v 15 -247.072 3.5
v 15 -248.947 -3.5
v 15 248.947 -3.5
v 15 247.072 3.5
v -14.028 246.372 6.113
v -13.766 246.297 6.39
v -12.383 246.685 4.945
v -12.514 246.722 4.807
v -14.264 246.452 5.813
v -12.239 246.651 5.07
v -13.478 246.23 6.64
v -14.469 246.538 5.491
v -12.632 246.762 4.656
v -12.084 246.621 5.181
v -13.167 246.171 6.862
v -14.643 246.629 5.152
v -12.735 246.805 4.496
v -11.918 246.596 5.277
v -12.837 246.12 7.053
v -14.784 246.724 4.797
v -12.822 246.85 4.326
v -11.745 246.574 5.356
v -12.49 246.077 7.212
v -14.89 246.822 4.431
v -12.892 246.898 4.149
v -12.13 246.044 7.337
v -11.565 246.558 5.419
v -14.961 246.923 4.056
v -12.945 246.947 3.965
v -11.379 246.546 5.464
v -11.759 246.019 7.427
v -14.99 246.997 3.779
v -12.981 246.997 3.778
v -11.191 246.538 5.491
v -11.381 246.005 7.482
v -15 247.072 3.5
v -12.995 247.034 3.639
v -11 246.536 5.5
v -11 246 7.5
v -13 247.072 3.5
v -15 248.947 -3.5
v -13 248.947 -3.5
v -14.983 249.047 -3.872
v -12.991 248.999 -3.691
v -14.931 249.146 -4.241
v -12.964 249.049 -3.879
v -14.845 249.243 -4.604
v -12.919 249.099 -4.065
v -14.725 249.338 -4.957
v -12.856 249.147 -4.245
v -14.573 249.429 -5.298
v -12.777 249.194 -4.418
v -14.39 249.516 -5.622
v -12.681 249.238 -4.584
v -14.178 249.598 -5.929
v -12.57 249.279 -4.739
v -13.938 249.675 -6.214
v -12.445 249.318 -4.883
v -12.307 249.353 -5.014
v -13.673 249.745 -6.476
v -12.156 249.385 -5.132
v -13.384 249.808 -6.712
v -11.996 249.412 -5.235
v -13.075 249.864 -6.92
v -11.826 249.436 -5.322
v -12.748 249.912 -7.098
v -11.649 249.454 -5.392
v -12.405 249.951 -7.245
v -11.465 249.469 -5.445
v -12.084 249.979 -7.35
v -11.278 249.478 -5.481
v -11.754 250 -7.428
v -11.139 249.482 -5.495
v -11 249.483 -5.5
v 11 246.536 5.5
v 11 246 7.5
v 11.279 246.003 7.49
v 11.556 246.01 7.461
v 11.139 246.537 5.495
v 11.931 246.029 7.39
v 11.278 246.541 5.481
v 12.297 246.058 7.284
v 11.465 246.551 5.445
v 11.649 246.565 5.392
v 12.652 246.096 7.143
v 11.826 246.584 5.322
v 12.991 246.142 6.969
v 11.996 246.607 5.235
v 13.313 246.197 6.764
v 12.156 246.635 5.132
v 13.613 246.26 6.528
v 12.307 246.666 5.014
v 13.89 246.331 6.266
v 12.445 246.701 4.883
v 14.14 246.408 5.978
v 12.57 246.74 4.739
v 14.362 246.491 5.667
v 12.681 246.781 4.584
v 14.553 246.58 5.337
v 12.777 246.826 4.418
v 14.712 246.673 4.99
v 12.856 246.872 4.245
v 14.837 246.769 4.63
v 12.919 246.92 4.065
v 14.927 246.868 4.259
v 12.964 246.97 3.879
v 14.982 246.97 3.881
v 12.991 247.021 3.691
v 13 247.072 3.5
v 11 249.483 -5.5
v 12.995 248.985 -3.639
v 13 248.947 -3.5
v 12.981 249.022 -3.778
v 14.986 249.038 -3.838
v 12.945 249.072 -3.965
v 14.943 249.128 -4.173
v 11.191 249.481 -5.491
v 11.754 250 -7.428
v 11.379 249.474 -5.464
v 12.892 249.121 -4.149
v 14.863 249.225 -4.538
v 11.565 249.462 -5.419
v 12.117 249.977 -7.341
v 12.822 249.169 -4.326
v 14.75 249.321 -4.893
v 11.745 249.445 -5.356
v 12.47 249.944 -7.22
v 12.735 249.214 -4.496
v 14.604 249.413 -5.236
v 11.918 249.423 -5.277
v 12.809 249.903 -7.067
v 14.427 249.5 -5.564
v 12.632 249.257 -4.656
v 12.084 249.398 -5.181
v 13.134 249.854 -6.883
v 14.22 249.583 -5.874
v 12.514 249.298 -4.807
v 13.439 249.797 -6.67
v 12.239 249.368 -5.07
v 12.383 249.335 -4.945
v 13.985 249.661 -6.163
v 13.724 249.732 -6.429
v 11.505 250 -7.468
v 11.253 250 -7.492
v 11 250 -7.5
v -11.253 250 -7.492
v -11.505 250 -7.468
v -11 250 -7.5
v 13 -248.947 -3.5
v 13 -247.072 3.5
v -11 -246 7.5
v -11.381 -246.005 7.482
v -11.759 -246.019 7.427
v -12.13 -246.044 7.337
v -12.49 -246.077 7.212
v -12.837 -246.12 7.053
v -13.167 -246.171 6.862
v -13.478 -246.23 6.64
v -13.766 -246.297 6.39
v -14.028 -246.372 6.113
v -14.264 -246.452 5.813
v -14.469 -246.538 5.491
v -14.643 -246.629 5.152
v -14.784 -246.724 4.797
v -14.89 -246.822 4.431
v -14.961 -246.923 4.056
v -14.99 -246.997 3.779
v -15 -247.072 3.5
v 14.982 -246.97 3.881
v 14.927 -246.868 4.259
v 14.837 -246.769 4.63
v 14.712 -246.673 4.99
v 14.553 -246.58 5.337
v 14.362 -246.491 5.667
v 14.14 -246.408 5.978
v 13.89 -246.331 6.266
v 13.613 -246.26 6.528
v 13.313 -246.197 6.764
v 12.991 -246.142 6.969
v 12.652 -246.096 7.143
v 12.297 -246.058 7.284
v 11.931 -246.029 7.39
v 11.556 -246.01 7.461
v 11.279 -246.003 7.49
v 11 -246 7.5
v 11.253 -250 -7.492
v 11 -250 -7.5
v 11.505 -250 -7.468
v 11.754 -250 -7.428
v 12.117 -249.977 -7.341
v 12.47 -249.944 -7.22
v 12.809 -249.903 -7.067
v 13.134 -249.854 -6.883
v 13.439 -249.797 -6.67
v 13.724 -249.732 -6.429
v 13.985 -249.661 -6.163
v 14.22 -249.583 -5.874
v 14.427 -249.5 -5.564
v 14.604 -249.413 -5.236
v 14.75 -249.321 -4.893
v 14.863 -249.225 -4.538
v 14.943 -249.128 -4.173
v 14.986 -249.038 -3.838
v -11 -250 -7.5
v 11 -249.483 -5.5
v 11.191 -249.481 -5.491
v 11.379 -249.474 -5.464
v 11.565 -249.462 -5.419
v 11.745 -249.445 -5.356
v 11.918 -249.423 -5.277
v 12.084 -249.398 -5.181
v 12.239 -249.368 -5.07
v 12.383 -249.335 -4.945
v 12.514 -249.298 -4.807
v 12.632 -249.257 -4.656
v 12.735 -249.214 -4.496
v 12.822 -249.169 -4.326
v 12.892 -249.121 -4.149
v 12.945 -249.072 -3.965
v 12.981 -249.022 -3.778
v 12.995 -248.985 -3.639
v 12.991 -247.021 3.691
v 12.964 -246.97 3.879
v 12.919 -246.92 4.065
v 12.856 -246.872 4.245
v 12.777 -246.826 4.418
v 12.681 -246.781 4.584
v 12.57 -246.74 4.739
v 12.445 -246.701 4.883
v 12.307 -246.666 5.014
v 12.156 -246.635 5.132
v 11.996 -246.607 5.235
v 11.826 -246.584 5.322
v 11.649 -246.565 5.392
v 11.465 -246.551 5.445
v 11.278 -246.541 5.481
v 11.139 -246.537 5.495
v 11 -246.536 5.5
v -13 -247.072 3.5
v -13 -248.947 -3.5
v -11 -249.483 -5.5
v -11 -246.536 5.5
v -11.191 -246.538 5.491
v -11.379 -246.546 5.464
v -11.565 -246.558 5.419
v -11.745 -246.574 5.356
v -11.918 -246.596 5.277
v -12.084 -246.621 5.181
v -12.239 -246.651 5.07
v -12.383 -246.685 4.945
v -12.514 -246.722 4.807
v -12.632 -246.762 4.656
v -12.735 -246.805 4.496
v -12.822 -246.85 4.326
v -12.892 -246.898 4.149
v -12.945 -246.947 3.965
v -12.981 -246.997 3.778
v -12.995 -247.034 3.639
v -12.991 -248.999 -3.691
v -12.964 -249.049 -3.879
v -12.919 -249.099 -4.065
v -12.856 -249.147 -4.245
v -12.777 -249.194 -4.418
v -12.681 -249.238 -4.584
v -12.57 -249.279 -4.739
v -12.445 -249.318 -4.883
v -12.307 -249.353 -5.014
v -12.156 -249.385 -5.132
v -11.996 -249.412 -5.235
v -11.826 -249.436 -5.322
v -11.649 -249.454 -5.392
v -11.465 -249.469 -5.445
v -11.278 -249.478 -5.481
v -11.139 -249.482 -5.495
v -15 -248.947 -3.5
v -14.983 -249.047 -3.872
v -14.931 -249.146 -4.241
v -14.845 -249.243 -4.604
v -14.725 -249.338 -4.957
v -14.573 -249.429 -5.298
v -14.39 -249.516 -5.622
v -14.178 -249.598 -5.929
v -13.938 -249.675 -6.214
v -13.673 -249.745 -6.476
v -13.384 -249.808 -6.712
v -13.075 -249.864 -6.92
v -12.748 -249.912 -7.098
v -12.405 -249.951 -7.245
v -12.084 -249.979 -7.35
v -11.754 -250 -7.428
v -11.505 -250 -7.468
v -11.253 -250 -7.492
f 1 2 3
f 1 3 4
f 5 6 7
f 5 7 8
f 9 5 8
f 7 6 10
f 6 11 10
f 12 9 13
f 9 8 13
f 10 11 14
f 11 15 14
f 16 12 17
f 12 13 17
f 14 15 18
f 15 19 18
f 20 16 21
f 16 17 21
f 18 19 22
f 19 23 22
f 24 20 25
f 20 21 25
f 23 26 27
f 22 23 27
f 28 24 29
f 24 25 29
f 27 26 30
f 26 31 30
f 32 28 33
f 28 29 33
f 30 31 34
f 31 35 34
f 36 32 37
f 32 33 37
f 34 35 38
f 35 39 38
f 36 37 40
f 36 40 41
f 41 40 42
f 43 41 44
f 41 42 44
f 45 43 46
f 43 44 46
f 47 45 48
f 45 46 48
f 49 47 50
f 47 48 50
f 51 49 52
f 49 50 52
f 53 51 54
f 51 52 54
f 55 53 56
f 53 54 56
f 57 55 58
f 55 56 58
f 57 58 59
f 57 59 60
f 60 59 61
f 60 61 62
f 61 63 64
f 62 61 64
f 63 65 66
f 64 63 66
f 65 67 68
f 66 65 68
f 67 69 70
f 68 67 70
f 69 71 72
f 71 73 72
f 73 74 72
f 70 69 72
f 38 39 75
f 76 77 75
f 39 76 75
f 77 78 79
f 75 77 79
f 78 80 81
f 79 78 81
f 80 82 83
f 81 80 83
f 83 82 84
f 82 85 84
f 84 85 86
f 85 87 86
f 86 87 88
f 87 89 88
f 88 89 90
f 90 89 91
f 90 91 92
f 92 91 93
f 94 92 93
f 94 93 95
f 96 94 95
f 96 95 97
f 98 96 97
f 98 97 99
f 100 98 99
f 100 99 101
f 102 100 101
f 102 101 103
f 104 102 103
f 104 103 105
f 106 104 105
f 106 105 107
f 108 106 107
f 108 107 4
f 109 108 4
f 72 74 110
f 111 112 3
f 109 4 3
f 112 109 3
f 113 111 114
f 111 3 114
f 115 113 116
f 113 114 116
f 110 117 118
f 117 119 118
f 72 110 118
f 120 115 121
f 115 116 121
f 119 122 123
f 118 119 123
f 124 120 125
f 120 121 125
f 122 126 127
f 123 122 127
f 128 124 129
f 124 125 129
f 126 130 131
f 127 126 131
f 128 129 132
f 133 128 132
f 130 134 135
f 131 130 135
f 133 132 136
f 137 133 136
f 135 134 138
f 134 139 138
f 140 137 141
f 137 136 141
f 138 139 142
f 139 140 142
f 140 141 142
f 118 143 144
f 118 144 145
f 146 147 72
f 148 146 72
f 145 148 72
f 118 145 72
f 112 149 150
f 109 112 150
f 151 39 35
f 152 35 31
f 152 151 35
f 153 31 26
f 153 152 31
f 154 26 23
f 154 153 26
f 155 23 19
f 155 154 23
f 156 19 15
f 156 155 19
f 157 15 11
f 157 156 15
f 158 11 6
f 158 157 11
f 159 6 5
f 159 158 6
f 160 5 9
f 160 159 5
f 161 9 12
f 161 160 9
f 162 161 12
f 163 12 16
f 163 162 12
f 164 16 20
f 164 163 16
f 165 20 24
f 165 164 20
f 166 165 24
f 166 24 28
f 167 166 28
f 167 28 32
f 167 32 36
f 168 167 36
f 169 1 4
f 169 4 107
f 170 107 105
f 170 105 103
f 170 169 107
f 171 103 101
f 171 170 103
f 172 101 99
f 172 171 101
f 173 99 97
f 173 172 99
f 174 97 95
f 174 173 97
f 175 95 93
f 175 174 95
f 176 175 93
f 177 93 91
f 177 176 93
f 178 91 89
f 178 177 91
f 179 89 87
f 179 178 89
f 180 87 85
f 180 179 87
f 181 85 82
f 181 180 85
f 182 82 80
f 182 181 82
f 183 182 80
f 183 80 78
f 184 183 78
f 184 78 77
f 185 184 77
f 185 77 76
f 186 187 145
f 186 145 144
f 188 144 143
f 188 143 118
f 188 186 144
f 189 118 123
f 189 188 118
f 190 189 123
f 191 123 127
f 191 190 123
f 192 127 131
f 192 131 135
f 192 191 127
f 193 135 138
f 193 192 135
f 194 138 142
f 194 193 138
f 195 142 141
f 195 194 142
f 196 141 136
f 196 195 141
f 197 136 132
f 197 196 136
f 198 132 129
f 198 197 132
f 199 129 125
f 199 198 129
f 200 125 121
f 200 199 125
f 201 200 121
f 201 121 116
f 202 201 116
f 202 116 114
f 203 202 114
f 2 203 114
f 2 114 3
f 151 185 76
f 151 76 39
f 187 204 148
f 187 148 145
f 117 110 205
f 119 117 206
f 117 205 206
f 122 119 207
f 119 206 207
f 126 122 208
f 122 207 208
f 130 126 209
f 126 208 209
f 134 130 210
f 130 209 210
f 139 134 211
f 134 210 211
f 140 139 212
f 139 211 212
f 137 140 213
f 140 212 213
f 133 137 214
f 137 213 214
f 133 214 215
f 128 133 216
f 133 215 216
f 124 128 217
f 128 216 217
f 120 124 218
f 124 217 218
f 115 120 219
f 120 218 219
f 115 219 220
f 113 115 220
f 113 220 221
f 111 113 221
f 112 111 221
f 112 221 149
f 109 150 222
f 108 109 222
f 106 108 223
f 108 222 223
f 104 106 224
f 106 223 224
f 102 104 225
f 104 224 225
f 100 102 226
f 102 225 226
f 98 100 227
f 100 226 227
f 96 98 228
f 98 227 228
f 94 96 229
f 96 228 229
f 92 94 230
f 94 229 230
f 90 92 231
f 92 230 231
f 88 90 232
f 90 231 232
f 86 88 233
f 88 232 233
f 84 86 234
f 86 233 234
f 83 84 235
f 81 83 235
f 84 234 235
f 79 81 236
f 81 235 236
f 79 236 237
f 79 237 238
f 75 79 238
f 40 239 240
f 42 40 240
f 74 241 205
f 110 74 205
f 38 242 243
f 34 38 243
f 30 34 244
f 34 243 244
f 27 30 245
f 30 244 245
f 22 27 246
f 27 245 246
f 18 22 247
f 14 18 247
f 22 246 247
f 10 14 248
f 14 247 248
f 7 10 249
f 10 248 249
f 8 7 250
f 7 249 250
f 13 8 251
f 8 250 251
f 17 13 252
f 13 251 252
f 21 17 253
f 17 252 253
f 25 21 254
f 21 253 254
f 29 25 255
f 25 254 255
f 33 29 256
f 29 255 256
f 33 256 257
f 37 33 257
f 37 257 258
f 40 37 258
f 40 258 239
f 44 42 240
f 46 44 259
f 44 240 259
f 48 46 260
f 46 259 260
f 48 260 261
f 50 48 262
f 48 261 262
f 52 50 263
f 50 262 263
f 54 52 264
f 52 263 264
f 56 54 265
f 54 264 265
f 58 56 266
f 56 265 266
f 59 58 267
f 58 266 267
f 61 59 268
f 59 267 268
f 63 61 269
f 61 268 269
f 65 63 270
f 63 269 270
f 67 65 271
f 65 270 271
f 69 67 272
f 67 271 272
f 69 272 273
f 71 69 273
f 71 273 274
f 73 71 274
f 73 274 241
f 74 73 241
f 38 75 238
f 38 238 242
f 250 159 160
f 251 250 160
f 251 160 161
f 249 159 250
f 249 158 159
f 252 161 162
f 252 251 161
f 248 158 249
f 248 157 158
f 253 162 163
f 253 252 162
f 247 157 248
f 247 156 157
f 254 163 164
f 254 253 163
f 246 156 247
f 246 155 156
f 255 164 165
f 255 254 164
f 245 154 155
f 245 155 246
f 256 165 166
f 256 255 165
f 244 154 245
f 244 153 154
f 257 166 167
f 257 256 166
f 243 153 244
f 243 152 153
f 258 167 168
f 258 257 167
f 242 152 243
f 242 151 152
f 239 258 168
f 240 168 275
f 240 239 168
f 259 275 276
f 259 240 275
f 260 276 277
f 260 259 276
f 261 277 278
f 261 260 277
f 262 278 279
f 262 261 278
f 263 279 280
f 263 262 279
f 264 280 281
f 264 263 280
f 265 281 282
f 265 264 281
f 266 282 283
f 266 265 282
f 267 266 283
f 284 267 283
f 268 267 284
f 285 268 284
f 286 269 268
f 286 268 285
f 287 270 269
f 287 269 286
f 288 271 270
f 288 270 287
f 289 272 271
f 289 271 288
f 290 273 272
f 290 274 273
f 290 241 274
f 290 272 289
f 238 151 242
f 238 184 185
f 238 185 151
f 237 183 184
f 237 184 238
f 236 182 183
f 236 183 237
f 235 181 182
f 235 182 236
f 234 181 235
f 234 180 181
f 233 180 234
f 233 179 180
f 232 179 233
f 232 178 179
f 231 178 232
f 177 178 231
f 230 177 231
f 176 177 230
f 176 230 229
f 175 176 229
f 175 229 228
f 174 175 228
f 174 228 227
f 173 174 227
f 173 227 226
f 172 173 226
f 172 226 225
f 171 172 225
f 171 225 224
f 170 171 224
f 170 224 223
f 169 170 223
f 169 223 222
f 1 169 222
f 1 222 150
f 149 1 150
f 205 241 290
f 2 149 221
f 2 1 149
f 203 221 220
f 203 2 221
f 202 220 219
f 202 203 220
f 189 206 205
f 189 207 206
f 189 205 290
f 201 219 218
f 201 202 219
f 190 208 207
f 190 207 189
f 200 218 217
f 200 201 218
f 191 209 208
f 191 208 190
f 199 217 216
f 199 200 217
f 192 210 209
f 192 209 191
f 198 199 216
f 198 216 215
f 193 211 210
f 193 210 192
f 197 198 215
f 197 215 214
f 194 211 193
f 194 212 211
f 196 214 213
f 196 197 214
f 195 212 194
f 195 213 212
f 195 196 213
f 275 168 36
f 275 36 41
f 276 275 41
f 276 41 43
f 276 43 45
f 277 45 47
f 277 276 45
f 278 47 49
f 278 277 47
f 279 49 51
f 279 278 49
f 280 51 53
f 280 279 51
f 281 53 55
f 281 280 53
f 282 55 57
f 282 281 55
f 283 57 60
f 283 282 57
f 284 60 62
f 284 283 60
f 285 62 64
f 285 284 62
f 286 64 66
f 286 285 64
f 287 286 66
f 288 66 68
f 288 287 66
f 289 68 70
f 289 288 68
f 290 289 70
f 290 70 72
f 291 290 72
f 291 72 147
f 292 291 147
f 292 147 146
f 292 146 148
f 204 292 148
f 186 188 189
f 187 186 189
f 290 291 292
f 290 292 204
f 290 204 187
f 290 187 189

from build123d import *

# Parameters (mm, degrees)
EXTRUDE_1_DEPTH      = 250
EXTRUDE_1_DEPTH_BACK = 250
CHAMFER_1_SIZE       = 4
CHAMFER_1_SIZE_2     = 14.92820323


with BuildPart() as part:
    # Эскиз1 → Вытянуть-Тонкостенный1 (new, two sides: drawn at the far end of the back side and taken through both)
    with BuildSketch(Plane(origin=(0, 0, 0), x_dir=(1, 0, 0), z_dir=(0, 1, 0)).offset(-EXTRUDE_1_DEPTH_BACK)):
        with BuildLine():
            Line((-11, 7.5), (11, 7.5))
            ThreePointArc((11, 7.5), (13.828427125, 6.328427125), (15, 3.5))
            Line((15, 3.5), (15, -3.5))
            ThreePointArc((15, -3.5), (13.828427125, -6.328427125), (11, -7.5))
            Line((11, -7.5), (-11, -7.5))
            ThreePointArc((-11, -7.5), (-13.828427125, -6.328427125), (-15, -3.5))
            Line((-15, -3.5), (-15, 3.5))
            ThreePointArc((-15, 3.5), (-13.828427125, 6.328427125), (-11, 7.5))
        make_face()
        with BuildLine():
            Line((-11, 5.5), (11, 5.5))
            ThreePointArc((11, 5.5), (12.414213562, 4.914213562), (13, 3.5))
            Line((13, 3.5), (13, -3.5))
            ThreePointArc((13, -3.5), (12.414213562, -4.914213562), (11, -5.5))
            Line((11, -5.5), (-11, -5.5))
            ThreePointArc((-11, -5.5), (-12.414213562, -4.914213562), (-13, -3.5))
            Line((-13, -3.5), (-13, 3.5))
            ThreePointArc((-13, 3.5), (-12.414213562, 4.914213562), (-11, 5.5))
        make_face(mode=Mode.SUBTRACT)
    extrude(amount=EXTRUDE_1_DEPTH + EXTRUDE_1_DEPTH_BACK)

    # Фаска1
    # the kernel refuses this chamfer: 14.92820323, 4 mm, written as the material it takes off along each edge
    with BuildSketch(Plane(origin=(49.764387332, -250, 7.5), x_dir=(0, 0.9905000388259542, 0.13751244702129073), z_dir=(-1, 0, 0))) as chamfer_1_piece_1:
        Polygon((CHAMFER_1_SIZE * 0.990500038826, CHAMFER_1_SIZE * 0.137512447021), (-CHAMFER_1_SIZE_2 * 0.137512447024, CHAMFER_1_SIZE_2 * 0.990500038844), (0, 0), align=None)
    extrude(amount=99.528774665, mode=Mode.SUBTRACT)
    with BuildSketch(Plane(origin=(49.764387332, 250, 7.5), x_dir=(0, -0.9905000388259542, 0.13751244702129073), z_dir=(-1, 0, 0))) as chamfer_1_piece_2:
        Polygon((CHAMFER_1_SIZE * 0.990500038826, -CHAMFER_1_SIZE * 0.137512447021), (-CHAMFER_1_SIZE_2 * 0.137512447024, -CHAMFER_1_SIZE_2 * 0.990500038844), (0, 0), align=None)
    extrude(amount=99.528774665, mode=Mode.SUBTRACT)


solid = part.part
